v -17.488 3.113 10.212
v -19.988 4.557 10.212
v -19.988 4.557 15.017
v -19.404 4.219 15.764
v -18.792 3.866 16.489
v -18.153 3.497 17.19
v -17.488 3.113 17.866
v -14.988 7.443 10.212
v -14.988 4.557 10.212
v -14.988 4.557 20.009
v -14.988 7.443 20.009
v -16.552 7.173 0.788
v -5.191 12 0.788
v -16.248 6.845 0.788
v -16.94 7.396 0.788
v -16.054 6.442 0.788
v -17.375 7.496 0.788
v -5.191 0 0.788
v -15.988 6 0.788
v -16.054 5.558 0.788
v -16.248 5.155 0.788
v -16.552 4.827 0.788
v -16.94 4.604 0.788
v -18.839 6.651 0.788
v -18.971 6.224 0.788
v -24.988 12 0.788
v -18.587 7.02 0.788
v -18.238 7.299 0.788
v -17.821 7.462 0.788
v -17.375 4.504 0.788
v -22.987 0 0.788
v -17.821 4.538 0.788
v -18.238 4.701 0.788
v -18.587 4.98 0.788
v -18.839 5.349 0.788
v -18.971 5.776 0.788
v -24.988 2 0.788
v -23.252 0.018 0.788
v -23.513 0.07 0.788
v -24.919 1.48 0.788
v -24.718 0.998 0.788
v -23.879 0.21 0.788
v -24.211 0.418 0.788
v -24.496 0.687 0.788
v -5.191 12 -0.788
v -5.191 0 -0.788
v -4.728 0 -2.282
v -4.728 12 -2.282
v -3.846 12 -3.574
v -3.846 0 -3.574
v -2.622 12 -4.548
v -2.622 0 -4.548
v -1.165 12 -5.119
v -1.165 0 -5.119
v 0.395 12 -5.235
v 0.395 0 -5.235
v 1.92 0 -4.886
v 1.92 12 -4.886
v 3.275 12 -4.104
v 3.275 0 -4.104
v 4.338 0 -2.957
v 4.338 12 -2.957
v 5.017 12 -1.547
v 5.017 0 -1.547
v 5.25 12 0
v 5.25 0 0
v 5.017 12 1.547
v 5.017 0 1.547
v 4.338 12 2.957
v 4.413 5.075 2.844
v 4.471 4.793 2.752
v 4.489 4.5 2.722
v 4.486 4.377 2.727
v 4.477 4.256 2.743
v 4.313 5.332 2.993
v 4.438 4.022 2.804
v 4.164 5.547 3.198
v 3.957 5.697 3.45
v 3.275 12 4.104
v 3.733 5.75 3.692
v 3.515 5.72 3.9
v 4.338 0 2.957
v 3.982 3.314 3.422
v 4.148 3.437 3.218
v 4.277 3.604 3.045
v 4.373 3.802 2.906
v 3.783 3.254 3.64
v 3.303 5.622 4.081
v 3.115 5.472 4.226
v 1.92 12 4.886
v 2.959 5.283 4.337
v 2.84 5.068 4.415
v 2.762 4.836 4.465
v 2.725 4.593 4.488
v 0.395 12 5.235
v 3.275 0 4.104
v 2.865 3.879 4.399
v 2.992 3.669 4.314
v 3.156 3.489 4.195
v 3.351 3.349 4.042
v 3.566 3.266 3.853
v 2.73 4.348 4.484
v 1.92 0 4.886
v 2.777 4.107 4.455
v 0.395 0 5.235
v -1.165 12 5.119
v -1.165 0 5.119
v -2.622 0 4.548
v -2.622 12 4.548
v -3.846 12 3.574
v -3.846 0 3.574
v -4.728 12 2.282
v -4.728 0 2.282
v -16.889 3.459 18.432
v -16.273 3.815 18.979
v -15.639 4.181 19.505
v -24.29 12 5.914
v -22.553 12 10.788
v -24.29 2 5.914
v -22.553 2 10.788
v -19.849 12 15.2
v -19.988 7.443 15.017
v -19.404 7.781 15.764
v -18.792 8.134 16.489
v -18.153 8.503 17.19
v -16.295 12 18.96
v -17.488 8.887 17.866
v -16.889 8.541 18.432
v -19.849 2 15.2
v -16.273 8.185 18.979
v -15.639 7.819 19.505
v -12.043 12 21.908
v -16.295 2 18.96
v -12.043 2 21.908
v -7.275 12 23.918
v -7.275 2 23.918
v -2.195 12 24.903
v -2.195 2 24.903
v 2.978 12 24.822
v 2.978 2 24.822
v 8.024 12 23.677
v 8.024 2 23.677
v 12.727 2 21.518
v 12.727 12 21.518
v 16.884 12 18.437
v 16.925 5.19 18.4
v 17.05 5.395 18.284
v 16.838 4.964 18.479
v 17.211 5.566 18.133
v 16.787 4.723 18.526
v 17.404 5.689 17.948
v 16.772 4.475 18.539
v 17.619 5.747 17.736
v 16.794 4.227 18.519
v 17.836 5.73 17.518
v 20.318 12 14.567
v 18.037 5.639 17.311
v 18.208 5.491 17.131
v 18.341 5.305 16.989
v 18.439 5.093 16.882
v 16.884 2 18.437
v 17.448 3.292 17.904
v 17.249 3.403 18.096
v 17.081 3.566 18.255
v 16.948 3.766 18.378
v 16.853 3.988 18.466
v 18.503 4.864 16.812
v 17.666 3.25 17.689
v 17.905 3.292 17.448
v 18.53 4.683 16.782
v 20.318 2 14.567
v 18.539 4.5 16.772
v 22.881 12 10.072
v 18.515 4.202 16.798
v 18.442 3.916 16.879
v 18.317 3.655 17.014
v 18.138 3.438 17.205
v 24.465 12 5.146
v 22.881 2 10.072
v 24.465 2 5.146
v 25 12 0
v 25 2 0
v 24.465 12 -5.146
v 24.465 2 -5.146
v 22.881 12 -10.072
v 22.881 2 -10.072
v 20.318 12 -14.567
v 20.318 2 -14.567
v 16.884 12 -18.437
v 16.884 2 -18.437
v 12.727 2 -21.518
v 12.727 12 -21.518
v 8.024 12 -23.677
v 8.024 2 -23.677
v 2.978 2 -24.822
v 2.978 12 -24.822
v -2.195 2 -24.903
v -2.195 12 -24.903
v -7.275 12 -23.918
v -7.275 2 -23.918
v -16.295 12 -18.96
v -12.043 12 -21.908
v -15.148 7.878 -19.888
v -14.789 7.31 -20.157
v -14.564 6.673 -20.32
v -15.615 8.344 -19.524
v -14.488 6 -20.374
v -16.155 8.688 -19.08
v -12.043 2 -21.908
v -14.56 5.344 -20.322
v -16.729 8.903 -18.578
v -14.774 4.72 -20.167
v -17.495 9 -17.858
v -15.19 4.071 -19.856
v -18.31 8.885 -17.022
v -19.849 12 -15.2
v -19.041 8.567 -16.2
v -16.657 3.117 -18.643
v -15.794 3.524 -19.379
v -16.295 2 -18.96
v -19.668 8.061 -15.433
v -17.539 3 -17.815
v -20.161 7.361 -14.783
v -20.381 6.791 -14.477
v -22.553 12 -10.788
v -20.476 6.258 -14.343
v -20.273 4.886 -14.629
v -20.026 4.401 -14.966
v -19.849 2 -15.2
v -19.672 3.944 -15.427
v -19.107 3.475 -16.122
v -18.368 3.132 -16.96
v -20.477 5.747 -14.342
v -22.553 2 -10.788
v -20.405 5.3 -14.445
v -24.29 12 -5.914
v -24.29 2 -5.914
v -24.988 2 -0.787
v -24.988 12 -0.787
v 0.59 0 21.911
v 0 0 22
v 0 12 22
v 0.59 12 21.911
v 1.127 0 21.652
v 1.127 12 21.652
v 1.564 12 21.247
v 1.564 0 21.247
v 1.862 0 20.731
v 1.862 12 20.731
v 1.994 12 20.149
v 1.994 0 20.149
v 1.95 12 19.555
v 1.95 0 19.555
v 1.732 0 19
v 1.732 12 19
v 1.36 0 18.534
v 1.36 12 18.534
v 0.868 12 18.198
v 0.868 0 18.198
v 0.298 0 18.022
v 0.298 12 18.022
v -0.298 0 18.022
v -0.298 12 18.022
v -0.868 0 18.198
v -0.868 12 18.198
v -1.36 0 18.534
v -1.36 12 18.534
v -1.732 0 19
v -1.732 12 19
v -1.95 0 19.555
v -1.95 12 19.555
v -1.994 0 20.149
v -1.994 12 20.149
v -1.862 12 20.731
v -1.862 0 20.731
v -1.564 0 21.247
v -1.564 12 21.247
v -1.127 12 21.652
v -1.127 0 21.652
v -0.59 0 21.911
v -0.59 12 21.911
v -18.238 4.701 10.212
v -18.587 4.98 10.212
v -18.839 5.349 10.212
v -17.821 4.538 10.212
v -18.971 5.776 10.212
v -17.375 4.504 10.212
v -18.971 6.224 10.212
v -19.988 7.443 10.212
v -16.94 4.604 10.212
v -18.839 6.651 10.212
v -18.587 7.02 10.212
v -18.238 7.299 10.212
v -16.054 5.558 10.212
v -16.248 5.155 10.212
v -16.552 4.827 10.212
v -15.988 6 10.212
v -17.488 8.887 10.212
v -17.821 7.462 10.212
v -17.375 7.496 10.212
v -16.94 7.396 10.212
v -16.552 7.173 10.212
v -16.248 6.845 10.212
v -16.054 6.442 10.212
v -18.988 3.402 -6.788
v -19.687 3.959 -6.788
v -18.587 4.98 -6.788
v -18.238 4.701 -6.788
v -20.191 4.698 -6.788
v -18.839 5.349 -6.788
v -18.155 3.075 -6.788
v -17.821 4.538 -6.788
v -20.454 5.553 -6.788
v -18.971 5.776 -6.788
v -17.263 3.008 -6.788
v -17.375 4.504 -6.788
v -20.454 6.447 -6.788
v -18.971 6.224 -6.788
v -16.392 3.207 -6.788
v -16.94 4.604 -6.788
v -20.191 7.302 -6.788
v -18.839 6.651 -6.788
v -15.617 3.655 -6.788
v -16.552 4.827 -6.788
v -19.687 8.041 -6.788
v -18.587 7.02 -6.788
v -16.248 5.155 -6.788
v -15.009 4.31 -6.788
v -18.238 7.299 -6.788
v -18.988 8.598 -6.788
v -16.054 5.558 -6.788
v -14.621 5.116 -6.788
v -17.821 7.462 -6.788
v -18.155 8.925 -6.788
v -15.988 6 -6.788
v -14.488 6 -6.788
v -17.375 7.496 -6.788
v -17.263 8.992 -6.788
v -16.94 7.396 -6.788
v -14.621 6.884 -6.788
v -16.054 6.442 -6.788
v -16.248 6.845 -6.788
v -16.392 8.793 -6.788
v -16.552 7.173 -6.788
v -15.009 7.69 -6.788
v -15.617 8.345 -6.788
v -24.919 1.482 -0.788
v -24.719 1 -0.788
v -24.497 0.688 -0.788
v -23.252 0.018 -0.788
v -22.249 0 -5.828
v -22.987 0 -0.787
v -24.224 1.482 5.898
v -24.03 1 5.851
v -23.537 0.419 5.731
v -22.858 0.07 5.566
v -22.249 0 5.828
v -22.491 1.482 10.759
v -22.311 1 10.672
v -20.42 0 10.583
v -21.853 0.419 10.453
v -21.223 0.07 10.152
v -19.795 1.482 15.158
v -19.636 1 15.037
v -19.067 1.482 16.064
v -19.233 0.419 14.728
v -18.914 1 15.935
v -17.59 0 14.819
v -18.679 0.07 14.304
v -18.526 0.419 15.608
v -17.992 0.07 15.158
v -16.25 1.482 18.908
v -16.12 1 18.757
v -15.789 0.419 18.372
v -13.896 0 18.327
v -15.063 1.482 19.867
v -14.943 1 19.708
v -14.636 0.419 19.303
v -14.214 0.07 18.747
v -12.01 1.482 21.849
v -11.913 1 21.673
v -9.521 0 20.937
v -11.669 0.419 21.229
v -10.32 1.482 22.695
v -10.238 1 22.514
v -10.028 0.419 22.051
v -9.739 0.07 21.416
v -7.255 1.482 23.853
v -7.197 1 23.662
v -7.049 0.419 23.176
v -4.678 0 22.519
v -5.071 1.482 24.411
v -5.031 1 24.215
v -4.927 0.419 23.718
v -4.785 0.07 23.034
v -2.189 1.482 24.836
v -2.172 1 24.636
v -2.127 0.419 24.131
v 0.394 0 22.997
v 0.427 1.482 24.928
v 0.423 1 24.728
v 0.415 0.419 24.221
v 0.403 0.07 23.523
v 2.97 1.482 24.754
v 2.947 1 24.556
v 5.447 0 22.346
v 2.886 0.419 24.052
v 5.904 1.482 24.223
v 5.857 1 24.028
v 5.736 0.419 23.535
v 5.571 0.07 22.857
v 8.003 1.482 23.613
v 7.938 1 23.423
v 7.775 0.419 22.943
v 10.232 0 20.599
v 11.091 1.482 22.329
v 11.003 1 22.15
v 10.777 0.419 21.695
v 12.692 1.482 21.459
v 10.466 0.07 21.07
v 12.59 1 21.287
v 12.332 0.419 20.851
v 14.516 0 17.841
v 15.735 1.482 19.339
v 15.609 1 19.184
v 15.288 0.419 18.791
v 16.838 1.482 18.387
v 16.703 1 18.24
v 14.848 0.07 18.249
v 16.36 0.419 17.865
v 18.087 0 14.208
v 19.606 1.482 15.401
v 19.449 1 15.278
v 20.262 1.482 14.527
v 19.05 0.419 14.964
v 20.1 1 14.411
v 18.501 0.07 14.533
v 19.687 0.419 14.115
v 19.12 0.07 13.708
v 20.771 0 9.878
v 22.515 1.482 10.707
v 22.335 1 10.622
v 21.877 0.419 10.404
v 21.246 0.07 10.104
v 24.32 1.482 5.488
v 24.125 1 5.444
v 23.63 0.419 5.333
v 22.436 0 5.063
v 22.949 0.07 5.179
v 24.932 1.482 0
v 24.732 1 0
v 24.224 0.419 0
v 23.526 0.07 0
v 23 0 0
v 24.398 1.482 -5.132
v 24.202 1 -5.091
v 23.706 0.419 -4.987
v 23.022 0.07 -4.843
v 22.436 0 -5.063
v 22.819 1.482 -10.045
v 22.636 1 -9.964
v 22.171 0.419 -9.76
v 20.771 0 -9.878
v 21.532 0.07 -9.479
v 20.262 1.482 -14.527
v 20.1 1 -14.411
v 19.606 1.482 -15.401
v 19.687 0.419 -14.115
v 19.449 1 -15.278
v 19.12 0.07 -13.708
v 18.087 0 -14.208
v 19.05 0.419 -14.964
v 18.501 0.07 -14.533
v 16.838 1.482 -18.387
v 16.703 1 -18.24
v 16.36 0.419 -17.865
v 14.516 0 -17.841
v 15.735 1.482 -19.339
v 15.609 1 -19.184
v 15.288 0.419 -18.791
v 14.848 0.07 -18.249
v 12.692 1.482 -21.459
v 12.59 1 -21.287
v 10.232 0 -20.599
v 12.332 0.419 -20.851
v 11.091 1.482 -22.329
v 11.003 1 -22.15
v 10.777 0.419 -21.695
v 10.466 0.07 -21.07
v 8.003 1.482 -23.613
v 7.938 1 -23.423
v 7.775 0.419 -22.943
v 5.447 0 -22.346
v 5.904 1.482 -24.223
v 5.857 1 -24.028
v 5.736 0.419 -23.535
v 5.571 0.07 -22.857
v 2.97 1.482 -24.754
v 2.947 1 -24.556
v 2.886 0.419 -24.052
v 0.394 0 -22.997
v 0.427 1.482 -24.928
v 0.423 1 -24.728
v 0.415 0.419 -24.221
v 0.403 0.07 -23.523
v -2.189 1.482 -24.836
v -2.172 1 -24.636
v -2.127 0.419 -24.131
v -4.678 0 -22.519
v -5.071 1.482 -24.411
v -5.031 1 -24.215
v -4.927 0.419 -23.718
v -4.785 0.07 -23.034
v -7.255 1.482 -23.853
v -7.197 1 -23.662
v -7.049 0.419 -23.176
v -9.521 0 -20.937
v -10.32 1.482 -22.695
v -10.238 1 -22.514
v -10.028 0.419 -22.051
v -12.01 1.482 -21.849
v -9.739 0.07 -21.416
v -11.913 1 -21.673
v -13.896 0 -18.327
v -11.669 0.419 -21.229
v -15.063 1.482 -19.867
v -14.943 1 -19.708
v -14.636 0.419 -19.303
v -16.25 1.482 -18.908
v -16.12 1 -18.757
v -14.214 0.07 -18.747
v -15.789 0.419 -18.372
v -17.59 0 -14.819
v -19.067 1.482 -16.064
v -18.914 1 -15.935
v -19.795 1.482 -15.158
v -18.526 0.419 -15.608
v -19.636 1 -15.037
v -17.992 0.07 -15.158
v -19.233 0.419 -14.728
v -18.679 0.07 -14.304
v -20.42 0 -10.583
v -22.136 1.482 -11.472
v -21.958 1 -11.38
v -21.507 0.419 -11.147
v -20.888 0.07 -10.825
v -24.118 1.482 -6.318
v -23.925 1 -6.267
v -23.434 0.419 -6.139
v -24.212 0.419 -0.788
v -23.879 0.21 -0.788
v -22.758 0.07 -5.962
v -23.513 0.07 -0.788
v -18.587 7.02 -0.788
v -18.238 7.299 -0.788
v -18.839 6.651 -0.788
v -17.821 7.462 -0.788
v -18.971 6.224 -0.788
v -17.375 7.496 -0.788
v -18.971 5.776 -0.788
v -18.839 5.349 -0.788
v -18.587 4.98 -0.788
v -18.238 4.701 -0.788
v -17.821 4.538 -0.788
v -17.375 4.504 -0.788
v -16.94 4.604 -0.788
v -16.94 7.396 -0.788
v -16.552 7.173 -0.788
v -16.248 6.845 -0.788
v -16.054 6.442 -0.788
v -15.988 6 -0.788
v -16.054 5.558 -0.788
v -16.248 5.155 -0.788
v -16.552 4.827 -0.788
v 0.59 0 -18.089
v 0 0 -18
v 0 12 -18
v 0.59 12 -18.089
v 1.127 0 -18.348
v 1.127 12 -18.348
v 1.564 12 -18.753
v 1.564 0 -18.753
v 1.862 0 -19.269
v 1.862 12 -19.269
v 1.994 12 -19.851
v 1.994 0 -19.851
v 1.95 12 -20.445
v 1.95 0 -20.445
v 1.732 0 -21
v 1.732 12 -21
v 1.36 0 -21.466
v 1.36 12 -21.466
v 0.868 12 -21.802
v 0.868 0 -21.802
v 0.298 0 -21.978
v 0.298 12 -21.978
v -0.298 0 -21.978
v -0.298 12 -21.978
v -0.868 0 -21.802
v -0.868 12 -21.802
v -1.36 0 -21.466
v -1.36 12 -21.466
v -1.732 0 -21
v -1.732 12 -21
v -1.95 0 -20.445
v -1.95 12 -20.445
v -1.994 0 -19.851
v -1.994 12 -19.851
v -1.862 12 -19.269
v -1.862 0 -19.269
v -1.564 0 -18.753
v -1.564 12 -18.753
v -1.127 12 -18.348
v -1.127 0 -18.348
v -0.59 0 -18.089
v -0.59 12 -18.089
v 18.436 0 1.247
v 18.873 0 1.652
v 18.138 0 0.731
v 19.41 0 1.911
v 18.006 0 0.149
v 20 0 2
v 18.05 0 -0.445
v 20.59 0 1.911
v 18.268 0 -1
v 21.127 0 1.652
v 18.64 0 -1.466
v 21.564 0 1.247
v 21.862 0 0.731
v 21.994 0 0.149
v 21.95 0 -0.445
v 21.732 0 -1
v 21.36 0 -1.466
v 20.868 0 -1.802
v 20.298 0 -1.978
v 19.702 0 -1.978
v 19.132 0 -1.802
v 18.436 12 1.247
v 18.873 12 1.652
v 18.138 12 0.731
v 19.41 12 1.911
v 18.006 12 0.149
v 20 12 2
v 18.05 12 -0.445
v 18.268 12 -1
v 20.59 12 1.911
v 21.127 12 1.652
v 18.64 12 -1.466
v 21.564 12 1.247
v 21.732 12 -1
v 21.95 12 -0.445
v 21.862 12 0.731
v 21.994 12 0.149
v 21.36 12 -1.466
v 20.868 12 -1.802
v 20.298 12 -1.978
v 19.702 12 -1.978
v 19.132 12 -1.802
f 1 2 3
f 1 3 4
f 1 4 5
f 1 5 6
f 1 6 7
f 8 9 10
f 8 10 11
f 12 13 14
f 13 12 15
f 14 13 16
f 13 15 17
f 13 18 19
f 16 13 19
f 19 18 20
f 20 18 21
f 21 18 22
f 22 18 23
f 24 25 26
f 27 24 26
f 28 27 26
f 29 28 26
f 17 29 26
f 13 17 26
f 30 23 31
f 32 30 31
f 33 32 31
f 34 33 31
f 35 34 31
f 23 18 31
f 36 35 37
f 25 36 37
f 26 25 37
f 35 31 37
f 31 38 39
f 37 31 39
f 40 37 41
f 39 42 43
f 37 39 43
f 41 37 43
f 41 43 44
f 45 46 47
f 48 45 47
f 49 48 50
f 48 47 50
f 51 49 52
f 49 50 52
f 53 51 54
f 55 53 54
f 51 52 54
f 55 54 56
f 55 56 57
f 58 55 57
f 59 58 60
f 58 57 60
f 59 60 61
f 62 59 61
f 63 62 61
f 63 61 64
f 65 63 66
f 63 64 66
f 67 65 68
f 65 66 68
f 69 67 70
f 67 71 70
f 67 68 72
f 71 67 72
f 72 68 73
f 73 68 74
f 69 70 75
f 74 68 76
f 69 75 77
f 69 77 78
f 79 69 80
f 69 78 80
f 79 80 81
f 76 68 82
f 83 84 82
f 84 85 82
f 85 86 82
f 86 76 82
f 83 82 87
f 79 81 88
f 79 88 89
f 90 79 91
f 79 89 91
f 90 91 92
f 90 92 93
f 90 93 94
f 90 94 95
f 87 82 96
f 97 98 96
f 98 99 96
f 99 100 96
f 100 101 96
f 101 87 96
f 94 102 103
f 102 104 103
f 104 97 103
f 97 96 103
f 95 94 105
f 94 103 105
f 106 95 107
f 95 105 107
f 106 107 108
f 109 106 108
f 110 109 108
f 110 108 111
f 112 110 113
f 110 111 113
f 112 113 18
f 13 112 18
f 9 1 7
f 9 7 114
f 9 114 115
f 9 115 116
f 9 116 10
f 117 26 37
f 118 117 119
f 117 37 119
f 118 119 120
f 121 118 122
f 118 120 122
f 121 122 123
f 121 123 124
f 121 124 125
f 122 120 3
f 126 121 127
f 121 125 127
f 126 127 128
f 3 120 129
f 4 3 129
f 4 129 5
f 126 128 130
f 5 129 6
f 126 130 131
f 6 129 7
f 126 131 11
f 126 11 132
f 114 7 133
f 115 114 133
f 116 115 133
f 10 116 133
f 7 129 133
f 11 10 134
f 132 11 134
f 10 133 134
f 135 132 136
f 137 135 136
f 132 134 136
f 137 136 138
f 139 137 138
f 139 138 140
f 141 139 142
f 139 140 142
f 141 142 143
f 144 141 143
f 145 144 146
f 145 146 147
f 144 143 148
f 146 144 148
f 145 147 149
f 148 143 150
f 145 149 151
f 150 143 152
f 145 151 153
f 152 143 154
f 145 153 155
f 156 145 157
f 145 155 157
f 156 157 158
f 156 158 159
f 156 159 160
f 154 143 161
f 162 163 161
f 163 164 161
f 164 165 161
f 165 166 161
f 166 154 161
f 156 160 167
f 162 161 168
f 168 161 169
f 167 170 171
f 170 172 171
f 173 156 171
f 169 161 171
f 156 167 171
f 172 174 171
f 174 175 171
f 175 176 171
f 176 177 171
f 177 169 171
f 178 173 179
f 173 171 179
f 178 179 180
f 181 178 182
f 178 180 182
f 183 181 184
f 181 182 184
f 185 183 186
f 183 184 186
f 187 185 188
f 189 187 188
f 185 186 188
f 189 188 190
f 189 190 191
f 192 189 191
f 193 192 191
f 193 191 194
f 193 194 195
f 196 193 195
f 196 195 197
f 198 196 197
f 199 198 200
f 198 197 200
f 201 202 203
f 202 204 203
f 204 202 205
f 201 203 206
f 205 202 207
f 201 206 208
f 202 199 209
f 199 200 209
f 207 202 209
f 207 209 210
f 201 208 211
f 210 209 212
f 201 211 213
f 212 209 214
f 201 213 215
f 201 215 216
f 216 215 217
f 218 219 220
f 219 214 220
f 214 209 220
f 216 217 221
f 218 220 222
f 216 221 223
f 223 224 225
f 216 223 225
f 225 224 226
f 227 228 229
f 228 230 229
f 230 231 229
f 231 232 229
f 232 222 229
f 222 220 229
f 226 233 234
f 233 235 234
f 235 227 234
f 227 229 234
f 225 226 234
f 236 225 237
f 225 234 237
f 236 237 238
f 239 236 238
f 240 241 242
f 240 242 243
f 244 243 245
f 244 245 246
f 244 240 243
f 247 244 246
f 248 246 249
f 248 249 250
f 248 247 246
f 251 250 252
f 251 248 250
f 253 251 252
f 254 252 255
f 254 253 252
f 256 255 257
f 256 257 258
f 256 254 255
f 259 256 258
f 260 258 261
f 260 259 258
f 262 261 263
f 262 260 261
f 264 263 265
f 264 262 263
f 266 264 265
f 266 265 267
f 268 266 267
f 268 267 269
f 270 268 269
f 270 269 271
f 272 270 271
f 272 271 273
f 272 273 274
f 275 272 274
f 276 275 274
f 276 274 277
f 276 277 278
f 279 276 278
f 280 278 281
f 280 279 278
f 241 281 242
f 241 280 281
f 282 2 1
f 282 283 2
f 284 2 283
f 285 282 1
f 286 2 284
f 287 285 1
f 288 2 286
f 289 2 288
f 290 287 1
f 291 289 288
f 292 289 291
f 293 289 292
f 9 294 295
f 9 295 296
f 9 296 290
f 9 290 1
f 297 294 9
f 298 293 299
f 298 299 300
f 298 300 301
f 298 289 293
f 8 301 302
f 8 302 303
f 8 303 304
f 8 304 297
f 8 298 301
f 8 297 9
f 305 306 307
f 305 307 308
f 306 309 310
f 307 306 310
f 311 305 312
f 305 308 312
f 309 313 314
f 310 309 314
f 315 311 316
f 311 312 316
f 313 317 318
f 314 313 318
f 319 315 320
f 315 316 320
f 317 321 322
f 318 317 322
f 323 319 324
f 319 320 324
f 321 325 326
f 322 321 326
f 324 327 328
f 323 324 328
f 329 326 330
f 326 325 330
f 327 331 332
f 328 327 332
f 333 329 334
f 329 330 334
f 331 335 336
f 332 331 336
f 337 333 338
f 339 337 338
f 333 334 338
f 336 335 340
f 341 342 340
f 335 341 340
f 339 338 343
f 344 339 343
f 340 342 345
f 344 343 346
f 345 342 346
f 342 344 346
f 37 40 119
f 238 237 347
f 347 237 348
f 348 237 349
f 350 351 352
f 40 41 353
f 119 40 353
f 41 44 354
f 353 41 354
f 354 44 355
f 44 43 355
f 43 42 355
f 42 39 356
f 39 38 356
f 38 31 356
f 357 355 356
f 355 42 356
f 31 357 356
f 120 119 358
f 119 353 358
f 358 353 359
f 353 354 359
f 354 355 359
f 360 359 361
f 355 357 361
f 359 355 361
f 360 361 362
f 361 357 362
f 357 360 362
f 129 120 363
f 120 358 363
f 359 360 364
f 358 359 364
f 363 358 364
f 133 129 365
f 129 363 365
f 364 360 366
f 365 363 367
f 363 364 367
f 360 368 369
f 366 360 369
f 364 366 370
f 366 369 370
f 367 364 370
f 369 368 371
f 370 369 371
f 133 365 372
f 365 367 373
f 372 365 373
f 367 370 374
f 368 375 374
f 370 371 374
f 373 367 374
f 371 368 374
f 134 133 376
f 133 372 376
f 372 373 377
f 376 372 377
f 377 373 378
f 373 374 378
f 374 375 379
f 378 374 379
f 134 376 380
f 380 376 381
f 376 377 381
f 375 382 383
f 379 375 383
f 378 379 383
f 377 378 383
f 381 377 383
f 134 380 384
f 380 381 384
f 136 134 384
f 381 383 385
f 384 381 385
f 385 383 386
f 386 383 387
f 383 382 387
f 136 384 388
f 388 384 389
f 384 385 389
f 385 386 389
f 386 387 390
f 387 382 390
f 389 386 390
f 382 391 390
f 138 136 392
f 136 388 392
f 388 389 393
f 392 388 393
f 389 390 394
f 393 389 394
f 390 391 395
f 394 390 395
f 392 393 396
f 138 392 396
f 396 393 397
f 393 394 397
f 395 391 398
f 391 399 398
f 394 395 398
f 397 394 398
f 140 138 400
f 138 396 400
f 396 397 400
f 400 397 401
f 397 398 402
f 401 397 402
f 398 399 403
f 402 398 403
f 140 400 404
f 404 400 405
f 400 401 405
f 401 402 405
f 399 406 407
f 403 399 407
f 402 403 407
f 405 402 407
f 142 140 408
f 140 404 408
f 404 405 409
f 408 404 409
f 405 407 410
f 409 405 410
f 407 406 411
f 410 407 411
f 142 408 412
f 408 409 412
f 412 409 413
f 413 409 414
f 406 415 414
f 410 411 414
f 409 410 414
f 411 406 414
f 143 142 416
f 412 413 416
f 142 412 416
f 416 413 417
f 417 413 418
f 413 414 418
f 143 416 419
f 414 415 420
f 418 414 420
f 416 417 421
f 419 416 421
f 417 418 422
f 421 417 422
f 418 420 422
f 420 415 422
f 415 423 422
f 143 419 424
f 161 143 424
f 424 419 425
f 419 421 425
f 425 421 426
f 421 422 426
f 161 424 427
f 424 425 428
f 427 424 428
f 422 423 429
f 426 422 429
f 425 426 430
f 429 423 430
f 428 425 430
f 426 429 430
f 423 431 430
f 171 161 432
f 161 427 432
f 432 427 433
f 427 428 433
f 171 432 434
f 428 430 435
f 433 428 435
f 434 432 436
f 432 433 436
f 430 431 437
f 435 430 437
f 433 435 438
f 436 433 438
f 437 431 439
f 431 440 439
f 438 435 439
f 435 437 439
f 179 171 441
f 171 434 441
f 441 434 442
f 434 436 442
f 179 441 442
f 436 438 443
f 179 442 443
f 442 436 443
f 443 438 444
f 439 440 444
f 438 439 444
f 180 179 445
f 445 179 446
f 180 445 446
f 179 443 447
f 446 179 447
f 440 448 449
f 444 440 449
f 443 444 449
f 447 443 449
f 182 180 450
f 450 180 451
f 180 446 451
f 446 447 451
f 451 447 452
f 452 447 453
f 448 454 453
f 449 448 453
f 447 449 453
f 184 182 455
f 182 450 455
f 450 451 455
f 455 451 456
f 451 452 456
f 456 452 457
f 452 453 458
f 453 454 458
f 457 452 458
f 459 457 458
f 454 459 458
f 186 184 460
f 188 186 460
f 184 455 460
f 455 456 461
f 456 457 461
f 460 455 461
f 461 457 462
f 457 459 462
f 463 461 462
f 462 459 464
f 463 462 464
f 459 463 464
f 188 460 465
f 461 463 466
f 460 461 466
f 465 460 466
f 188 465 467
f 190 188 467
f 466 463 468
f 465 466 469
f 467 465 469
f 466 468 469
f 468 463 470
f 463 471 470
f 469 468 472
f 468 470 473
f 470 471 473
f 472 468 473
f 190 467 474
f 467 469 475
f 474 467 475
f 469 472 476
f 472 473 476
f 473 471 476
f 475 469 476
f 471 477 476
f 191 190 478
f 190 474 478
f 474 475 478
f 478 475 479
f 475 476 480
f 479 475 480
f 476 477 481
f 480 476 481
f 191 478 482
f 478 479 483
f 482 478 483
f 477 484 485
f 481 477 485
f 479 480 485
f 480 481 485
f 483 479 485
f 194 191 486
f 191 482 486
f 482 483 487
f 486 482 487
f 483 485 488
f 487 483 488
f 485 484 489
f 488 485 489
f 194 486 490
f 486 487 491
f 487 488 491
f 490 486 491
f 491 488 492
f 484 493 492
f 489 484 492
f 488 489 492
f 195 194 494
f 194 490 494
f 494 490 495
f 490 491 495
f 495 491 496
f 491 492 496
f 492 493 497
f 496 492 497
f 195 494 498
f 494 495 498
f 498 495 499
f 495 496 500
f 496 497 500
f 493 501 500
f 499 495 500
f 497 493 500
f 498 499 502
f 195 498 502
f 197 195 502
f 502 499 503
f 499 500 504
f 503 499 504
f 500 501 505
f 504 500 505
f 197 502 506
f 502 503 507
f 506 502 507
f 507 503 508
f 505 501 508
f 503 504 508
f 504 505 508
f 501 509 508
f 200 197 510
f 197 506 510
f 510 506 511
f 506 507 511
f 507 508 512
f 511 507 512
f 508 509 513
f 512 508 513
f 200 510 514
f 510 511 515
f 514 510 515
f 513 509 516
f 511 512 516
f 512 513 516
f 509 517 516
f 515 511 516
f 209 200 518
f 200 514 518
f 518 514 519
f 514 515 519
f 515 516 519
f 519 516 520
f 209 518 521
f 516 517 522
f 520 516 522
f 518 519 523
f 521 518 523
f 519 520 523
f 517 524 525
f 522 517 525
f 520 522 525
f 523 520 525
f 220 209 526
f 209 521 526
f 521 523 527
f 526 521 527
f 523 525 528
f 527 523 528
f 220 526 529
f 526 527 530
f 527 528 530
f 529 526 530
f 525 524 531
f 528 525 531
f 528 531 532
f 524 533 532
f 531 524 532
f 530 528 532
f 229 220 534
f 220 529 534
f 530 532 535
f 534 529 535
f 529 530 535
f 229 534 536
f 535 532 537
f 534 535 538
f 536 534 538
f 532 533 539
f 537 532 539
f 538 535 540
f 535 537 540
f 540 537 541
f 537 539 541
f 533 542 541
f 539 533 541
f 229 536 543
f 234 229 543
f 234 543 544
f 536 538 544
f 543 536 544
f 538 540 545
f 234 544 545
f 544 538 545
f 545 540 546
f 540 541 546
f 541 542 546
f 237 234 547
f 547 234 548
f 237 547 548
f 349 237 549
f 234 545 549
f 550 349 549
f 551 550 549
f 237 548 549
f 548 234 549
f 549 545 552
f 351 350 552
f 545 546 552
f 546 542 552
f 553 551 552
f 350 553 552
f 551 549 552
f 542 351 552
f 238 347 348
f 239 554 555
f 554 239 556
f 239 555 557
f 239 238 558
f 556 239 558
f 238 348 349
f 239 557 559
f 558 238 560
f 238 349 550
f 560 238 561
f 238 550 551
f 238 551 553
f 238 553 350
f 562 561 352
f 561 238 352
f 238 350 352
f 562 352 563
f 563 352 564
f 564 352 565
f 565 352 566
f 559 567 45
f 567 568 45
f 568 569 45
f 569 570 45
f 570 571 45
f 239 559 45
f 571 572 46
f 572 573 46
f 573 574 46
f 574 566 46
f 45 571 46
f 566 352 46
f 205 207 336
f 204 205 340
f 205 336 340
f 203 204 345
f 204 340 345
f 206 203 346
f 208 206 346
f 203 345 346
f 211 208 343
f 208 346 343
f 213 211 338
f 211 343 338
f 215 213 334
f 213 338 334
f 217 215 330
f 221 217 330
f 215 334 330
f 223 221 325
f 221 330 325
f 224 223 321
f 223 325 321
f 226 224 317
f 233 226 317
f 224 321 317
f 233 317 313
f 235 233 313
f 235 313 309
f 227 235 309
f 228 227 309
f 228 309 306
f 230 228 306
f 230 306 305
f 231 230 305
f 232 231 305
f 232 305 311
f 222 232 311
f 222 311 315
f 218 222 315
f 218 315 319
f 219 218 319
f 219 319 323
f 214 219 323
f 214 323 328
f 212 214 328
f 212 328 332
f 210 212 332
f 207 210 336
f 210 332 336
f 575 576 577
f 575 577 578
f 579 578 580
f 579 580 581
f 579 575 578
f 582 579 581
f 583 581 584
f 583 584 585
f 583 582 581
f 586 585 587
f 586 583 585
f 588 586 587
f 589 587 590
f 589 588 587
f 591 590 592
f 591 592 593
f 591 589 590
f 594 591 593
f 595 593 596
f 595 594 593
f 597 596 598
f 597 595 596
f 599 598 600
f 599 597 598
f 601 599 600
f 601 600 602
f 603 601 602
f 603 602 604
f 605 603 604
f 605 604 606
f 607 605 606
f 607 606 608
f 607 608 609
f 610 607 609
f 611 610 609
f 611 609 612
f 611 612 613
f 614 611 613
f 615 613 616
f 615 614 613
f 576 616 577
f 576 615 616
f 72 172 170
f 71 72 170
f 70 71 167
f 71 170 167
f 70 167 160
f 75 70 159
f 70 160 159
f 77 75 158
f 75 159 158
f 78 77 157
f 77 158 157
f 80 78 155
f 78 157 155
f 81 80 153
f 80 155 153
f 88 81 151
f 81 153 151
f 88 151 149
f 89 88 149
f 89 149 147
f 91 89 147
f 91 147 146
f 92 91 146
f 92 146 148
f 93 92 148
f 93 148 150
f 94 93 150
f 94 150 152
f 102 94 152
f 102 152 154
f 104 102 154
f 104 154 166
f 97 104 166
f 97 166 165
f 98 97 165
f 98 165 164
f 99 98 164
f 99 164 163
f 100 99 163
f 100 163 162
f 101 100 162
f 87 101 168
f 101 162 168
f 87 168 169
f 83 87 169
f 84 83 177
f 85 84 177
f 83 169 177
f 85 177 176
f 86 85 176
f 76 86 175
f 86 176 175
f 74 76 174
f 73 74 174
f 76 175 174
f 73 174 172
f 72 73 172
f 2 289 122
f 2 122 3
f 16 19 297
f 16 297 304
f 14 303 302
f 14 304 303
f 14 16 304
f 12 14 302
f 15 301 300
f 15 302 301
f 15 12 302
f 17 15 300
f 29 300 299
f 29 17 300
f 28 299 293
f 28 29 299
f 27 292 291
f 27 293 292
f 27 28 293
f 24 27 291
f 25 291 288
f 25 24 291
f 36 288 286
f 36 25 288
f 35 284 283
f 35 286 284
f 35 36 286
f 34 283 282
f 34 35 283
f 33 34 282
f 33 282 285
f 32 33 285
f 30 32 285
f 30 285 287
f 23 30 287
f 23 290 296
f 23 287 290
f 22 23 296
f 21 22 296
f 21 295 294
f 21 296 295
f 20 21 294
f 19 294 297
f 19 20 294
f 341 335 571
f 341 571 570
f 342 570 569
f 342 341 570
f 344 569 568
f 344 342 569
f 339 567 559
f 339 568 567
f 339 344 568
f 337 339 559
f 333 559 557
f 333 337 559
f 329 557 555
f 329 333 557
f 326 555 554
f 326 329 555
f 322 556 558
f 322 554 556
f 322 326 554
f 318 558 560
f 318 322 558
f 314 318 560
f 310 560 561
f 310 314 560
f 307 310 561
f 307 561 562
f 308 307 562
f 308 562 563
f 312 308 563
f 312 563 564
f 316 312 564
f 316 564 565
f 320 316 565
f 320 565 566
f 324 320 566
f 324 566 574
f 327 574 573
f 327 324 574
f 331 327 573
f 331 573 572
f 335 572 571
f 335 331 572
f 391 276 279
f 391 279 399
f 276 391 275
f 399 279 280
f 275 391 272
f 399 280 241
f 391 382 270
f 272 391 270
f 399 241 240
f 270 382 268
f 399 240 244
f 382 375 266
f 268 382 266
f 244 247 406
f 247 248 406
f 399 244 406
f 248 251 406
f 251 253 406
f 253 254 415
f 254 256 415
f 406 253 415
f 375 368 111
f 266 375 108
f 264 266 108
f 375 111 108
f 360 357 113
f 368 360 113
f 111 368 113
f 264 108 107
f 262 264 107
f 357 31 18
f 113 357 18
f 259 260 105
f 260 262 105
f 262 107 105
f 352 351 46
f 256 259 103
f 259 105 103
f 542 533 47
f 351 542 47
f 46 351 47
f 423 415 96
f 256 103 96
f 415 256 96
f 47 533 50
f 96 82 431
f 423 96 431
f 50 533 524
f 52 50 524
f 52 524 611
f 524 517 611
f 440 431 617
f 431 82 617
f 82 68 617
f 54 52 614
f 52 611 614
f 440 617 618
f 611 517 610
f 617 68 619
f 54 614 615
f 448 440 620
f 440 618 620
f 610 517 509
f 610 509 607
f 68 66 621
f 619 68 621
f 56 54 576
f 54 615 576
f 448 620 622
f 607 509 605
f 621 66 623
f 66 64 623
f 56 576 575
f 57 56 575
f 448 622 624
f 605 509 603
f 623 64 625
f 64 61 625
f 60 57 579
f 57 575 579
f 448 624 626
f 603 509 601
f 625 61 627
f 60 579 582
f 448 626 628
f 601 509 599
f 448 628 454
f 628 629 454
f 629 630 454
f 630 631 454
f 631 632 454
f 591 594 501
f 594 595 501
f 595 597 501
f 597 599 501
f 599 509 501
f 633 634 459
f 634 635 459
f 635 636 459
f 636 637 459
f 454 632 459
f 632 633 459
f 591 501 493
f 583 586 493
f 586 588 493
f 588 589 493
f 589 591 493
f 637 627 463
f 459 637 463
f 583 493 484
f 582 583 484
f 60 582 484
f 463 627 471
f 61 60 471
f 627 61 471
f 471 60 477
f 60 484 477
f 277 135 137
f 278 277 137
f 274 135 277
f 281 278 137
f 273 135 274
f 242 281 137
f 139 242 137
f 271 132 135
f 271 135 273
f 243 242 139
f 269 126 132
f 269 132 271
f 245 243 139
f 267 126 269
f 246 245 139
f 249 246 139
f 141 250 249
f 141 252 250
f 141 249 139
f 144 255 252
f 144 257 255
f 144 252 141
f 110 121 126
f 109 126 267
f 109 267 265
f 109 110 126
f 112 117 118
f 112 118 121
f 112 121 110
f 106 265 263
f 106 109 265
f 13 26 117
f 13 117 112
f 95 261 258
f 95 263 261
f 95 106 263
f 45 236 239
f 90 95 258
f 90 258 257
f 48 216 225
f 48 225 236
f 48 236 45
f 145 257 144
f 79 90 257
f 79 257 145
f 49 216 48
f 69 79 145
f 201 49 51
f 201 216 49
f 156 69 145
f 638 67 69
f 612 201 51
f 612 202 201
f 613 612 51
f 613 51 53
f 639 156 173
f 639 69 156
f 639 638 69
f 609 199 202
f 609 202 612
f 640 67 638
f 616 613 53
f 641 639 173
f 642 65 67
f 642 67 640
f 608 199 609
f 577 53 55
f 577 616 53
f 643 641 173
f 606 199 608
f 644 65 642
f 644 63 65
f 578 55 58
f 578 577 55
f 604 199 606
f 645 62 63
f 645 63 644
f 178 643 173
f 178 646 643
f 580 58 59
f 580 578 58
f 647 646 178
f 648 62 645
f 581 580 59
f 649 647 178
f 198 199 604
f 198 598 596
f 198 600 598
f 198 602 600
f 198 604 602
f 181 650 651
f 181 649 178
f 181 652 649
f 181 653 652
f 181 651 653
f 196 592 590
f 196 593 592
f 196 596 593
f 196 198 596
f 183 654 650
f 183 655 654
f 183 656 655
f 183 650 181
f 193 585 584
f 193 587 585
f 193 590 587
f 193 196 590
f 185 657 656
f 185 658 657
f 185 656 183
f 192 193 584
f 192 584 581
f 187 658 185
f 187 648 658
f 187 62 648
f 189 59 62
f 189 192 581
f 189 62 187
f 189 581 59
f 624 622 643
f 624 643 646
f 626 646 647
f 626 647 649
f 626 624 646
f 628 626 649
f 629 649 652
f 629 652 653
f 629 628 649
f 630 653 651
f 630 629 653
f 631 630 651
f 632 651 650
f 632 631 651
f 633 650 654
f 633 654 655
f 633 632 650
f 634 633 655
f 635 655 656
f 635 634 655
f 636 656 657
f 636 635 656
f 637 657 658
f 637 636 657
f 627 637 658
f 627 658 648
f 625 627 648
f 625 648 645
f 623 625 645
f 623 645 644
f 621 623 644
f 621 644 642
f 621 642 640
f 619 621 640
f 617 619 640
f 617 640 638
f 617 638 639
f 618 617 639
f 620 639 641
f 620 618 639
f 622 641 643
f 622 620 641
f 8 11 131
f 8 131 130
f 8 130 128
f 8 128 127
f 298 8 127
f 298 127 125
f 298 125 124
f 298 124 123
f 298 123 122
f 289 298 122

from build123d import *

# Parameters (mm, degrees)
SKETCH1_R               = 2
BOSS_EXTRUDE1_DEPTH     = 12
CUT_EXTRUDE1_REACH      = 63.528
CUT_EXTRUDE1_END_RADIUS = 5.25
SKETCH2_R               = 1.25
CUT_EXTRUDE2_REACH      = 45.868
CUT_EXTRUDE2_END_RADIUS = 25
CUT_EXTRUDE2_START      = -6
SKETCH3_R               = 3
CUT_EXTRUDE3_DEPTH      = 38.868128668
CUT_EXTRUDE3_DEPTH_BACK = 38.868128668
SKETCH3_4_R             = 1.5
CUT_EXTRUDE4_REACH      = 50.868
CUT_EXTRUDE4_END_RADIUS = 25
CUT_EXTRUDE4_START      = 11
FILLET1_R               = 2


with BuildPart() as part:
    # Sketch1 → Boss-Extrude1 (new body)
    with BuildSketch(Plane(origin=(0, 0, 0), x_dir=(1, 0, 0), z_dir=(0, 1, 0))):
        with BuildLine():
            ThreePointArc((-24.987593797, -0.7875), (25, 0), (-24.987593797, 0.7875))
            Line((-24.987593797, 0.7875), (-5.190601482, 0.7875))
            ThreePointArc((-5.190601482, 0.7875), (5.25, 0), (-5.190601482, -0.7875))
            Line((-5.190601482, -0.7875), (-24.987593797, -0.7875))
        make_face()
        with Locations(Location((0, 20, 0), (0, 0, 270))):
            Circle(SKETCH1_R, mode=Mode.SUBTRACT)
        with Locations(Location((20, 0, 0), (0, 0, 270))):
            Circle(SKETCH1_R, mode=Mode.SUBTRACT)
        with Locations(Location((0, -20, 0), (0, 0, 270))):
            Circle(SKETCH1_R, mode=Mode.SUBTRACT)
    extrude(amount=BOSS_EXTRUDE1_DEPTH)

    # Cut-Extrude1: up to this cylinder (the profile starts outside it)
    cut_extrude1_end = Plane(origin=(0, 4.5, 0), z_dir=(0, -1, 0)) * Cylinder(CUT_EXTRUDE1_END_RADIUS, 138.556, mode=Mode.PRIVATE)
    # Sketch2 → Cut-Extrude1 (cut, up to the surface)
    with BuildSketch(Plane(origin=(17.67766953, 0, 17.67766953), x_dir=(0, -1, 0), z_dir=(0.7071067811865464, 0, 0.7071067811865488)), mode=Mode.PRIVATE) as cut_extrude1_sk1:
        with Locations(Location((-4.5, 0, 0), (0, 0, 90))):
            Circle(SKETCH2_R)
    cut_extrude1_tool1 = extrude(cut_extrude1_sk1.sketch, amount=-CUT_EXTRUDE1_REACH, mode=Mode.PRIVATE) - cut_extrude1_end
    add(cut_extrude1_tool1.solids().sort_by_distance((17.67767, 4.5, 17.67767))[0], mode=Mode.SUBTRACT)

    # Cut-Extrude2: up to this cylinder (the profile starts inside it)
    cut_extrude2_end = Plane(origin=(0, 6, 0), z_dir=(0, -1, 0)) * Cylinder(CUT_EXTRUDE2_END_RADIUS, 142.736, mode=Mode.PRIVATE)
    # Sketch3 → Cut-Extrude2 (cut, up to the surface)
    with BuildSketch(Plane.XY.offset(-0.7875).offset(CUT_EXTRUDE2_START), mode=Mode.PRIVATE) as cut_extrude2_sk1:
        with Locations((-17.487593797, 6)):
            Circle(SKETCH3_R)
    cut_extrude2_tool1 = extrude(cut_extrude2_sk1.sketch, amount=-CUT_EXTRUDE2_REACH, mode=Mode.PRIVATE) & cut_extrude2_end
    add(cut_extrude2_tool1.solids().sort_by_distance((-17.487594, 6, -6.7875))[0], mode=Mode.SUBTRACT)

    # Sketch3<4> → Cut-Extrude3 (cut, two sides: drawn at the far end of the back side and taken through both)
    with BuildSketch(Plane.XY.offset(-0.7875).offset(-CUT_EXTRUDE3_DEPTH_BACK)):
        with Locations((-17.487593797, 6)):
            Circle(SKETCH3_4_R)
    extrude(amount=CUT_EXTRUDE3_DEPTH + CUT_EXTRUDE3_DEPTH_BACK, mode=Mode.SUBTRACT)

    # Cut-Extrude4: up to this cylinder (the profile starts inside it)
    cut_extrude4_end = Plane(origin=(0, 6, 0), z_dir=(0, -1, 0)) * Cylinder(CUT_EXTRUDE4_END_RADIUS, 152.736, mode=Mode.PRIVATE)
    # Sketch5 → Cut-Extrude4 (cut, up to the surface)
    with BuildSketch(Plane.XY.offset(-0.7875).offset(CUT_EXTRUDE4_START), mode=Mode.PRIVATE) as cut_extrude4_sk1:
        Polygon((-14.987593797, 7.443375673), (-17.487593797, 8.886751346), (-19.987593797, 7.443375673), (-19.987593797, 4.556624327), (-17.487593797, 3.113248654), (-14.987593797, 4.556624327), align=None)
    cut_extrude4_tool1 = extrude(cut_extrude4_sk1.sketch, amount=CUT_EXTRUDE4_REACH, mode=Mode.PRIVATE) & cut_extrude4_end
    add(cut_extrude4_tool1.solids().sort_by_distance((-17.487594, 6, 10.2125))[0], mode=Mode.SUBTRACT)

    # Fillet1
    fillet1_edges = [part.edges().sort_by_distance(p)[0] for p in [
        (25, 0, 0),
    ]]
    fillet(fillet1_edges, radius=FILLET1_R)


solid = part.part
